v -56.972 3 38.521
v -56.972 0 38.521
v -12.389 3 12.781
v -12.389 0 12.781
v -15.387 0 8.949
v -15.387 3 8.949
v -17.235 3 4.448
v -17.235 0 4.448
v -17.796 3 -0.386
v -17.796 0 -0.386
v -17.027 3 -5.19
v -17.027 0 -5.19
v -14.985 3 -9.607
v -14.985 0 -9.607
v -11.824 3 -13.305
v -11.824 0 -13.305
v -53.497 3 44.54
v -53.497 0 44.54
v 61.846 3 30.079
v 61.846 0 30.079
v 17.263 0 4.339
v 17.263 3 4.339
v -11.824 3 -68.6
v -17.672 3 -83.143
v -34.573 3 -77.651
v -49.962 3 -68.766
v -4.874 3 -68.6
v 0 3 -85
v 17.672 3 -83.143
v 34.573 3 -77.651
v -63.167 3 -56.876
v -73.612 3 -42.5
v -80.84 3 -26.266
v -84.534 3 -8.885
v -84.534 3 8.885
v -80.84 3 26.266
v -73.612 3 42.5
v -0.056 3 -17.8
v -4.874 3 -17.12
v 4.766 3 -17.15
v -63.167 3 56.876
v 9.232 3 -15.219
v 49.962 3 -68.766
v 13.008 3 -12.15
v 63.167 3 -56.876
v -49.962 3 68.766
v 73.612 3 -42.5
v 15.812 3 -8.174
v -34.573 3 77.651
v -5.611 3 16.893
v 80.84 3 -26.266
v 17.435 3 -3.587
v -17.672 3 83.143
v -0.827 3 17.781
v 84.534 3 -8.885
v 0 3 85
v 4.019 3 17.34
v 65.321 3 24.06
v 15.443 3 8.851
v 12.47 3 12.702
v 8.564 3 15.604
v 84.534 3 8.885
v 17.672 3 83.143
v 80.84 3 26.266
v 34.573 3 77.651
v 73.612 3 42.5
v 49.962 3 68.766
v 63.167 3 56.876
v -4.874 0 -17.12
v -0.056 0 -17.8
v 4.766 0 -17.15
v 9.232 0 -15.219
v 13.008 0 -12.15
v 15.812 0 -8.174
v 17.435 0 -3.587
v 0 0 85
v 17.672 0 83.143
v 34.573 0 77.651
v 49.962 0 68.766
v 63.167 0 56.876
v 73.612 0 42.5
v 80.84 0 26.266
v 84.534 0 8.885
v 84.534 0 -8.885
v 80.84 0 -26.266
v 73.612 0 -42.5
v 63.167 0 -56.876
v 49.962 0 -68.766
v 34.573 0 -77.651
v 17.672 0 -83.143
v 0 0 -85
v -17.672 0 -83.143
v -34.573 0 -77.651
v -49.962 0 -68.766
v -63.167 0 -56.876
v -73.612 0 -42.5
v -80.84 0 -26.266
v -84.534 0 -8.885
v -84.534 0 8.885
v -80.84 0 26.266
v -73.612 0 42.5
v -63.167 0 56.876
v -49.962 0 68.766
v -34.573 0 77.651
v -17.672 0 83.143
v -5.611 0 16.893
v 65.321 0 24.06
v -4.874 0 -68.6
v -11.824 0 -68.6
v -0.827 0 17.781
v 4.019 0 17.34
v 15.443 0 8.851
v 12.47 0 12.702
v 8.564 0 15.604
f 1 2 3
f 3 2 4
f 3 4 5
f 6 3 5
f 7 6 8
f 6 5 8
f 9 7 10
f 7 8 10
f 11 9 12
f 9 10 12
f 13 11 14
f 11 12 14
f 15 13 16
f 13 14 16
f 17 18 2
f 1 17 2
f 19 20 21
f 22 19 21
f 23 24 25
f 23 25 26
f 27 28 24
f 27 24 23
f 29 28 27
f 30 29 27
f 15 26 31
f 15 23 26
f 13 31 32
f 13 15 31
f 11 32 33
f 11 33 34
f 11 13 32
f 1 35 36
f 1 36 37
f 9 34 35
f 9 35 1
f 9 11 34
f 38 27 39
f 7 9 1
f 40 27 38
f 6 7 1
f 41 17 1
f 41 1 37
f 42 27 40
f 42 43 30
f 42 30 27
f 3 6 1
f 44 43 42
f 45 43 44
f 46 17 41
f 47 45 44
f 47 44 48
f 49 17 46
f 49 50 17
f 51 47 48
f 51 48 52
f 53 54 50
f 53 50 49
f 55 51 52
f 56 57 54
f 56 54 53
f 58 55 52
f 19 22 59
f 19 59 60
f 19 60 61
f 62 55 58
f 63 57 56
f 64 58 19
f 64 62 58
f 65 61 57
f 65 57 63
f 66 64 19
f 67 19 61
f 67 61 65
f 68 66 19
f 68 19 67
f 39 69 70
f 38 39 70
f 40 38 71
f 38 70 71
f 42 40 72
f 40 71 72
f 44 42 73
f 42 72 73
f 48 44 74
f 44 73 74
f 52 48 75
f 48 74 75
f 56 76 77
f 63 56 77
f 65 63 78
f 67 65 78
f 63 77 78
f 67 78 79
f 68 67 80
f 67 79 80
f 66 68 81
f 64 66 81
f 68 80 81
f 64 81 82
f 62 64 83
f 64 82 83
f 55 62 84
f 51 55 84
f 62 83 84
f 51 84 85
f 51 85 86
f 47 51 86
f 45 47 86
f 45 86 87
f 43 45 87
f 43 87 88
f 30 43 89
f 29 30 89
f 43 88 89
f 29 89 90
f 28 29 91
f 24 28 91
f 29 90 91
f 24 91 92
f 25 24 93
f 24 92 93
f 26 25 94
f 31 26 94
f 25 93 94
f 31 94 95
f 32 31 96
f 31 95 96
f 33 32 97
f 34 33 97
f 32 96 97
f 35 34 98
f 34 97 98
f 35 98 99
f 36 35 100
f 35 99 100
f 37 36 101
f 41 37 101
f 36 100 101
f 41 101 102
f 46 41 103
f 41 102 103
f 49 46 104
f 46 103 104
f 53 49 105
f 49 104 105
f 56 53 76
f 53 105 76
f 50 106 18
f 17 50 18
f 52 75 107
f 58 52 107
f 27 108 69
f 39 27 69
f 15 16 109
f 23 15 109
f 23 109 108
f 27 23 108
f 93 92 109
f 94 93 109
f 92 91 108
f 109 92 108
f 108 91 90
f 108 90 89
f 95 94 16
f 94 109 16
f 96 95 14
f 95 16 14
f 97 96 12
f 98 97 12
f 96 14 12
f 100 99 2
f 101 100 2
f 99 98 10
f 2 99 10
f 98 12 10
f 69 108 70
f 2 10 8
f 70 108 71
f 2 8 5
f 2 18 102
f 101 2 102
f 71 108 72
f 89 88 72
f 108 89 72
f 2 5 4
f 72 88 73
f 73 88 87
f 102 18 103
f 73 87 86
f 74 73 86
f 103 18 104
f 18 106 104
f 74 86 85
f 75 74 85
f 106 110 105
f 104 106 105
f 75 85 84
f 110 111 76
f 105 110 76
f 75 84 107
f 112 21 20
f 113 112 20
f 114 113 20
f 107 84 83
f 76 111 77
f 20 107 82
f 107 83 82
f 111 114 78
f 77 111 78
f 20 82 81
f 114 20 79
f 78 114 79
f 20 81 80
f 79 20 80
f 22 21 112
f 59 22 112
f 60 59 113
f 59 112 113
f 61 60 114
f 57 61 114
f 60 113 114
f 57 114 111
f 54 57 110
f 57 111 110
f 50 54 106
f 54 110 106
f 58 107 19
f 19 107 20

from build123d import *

# Parameters (mm, degrees)
CROQUIS3_R              = 85
SALIENTE_EXTRUIR1_DEPTH = 3


with BuildPart() as part:
    # Croquis3 → Saliente-Extruir1 (new body)
    with BuildSketch(Plane(origin=(0, 0, 0), x_dir=(1, 0, 0), z_dir=(0, 1, 0))):
        with Locations(Location((0, 0, 0), (0, 0, 270))):
            Circle(CROQUIS3_R)
        with BuildLine():
            Line((-4.87398, 68.6), (-4.87398, 17.119705575))
            ThreePointArc((-4.87398, 17.119705575), (9.231788563, 15.218872492), (17.434798803, 3.587170289))
            Line((17.434798803, 3.587170289), (65.3213327, -24.060132946))
            Line((65.3213327, -24.060132946), (61.8463327, -30.079009502))
            Line((61.8463327, -30.079009502), (17.263089933, -4.33886229))
            ThreePointArc((17.263089933, -4.33886229), (8.564035914, -15.604399664), (-5.610818803, -16.892563818))
            Line((-5.610818803, -16.892563818), (-53.4973527, -44.539867054))
            Line((-53.4973527, -44.539867054), (-56.9723527, -38.520990498))
            Line((-56.9723527, -38.520990498), (-12.389109933, -12.780843285))
            ThreePointArc((-12.389109933, -12.780843285), (-17.795824477, 0.385527171), (-11.82398, 13.305393529))
            Line((-11.82398, 13.305393529), (-11.82398, 68.6))
            Line((-11.82398, 68.6), (-4.87398, 68.6))
        make_face(mode=Mode.SUBTRACT)
    extrude(amount=SALIENTE_EXTRUIR1_DEPTH)


solid = part.part
